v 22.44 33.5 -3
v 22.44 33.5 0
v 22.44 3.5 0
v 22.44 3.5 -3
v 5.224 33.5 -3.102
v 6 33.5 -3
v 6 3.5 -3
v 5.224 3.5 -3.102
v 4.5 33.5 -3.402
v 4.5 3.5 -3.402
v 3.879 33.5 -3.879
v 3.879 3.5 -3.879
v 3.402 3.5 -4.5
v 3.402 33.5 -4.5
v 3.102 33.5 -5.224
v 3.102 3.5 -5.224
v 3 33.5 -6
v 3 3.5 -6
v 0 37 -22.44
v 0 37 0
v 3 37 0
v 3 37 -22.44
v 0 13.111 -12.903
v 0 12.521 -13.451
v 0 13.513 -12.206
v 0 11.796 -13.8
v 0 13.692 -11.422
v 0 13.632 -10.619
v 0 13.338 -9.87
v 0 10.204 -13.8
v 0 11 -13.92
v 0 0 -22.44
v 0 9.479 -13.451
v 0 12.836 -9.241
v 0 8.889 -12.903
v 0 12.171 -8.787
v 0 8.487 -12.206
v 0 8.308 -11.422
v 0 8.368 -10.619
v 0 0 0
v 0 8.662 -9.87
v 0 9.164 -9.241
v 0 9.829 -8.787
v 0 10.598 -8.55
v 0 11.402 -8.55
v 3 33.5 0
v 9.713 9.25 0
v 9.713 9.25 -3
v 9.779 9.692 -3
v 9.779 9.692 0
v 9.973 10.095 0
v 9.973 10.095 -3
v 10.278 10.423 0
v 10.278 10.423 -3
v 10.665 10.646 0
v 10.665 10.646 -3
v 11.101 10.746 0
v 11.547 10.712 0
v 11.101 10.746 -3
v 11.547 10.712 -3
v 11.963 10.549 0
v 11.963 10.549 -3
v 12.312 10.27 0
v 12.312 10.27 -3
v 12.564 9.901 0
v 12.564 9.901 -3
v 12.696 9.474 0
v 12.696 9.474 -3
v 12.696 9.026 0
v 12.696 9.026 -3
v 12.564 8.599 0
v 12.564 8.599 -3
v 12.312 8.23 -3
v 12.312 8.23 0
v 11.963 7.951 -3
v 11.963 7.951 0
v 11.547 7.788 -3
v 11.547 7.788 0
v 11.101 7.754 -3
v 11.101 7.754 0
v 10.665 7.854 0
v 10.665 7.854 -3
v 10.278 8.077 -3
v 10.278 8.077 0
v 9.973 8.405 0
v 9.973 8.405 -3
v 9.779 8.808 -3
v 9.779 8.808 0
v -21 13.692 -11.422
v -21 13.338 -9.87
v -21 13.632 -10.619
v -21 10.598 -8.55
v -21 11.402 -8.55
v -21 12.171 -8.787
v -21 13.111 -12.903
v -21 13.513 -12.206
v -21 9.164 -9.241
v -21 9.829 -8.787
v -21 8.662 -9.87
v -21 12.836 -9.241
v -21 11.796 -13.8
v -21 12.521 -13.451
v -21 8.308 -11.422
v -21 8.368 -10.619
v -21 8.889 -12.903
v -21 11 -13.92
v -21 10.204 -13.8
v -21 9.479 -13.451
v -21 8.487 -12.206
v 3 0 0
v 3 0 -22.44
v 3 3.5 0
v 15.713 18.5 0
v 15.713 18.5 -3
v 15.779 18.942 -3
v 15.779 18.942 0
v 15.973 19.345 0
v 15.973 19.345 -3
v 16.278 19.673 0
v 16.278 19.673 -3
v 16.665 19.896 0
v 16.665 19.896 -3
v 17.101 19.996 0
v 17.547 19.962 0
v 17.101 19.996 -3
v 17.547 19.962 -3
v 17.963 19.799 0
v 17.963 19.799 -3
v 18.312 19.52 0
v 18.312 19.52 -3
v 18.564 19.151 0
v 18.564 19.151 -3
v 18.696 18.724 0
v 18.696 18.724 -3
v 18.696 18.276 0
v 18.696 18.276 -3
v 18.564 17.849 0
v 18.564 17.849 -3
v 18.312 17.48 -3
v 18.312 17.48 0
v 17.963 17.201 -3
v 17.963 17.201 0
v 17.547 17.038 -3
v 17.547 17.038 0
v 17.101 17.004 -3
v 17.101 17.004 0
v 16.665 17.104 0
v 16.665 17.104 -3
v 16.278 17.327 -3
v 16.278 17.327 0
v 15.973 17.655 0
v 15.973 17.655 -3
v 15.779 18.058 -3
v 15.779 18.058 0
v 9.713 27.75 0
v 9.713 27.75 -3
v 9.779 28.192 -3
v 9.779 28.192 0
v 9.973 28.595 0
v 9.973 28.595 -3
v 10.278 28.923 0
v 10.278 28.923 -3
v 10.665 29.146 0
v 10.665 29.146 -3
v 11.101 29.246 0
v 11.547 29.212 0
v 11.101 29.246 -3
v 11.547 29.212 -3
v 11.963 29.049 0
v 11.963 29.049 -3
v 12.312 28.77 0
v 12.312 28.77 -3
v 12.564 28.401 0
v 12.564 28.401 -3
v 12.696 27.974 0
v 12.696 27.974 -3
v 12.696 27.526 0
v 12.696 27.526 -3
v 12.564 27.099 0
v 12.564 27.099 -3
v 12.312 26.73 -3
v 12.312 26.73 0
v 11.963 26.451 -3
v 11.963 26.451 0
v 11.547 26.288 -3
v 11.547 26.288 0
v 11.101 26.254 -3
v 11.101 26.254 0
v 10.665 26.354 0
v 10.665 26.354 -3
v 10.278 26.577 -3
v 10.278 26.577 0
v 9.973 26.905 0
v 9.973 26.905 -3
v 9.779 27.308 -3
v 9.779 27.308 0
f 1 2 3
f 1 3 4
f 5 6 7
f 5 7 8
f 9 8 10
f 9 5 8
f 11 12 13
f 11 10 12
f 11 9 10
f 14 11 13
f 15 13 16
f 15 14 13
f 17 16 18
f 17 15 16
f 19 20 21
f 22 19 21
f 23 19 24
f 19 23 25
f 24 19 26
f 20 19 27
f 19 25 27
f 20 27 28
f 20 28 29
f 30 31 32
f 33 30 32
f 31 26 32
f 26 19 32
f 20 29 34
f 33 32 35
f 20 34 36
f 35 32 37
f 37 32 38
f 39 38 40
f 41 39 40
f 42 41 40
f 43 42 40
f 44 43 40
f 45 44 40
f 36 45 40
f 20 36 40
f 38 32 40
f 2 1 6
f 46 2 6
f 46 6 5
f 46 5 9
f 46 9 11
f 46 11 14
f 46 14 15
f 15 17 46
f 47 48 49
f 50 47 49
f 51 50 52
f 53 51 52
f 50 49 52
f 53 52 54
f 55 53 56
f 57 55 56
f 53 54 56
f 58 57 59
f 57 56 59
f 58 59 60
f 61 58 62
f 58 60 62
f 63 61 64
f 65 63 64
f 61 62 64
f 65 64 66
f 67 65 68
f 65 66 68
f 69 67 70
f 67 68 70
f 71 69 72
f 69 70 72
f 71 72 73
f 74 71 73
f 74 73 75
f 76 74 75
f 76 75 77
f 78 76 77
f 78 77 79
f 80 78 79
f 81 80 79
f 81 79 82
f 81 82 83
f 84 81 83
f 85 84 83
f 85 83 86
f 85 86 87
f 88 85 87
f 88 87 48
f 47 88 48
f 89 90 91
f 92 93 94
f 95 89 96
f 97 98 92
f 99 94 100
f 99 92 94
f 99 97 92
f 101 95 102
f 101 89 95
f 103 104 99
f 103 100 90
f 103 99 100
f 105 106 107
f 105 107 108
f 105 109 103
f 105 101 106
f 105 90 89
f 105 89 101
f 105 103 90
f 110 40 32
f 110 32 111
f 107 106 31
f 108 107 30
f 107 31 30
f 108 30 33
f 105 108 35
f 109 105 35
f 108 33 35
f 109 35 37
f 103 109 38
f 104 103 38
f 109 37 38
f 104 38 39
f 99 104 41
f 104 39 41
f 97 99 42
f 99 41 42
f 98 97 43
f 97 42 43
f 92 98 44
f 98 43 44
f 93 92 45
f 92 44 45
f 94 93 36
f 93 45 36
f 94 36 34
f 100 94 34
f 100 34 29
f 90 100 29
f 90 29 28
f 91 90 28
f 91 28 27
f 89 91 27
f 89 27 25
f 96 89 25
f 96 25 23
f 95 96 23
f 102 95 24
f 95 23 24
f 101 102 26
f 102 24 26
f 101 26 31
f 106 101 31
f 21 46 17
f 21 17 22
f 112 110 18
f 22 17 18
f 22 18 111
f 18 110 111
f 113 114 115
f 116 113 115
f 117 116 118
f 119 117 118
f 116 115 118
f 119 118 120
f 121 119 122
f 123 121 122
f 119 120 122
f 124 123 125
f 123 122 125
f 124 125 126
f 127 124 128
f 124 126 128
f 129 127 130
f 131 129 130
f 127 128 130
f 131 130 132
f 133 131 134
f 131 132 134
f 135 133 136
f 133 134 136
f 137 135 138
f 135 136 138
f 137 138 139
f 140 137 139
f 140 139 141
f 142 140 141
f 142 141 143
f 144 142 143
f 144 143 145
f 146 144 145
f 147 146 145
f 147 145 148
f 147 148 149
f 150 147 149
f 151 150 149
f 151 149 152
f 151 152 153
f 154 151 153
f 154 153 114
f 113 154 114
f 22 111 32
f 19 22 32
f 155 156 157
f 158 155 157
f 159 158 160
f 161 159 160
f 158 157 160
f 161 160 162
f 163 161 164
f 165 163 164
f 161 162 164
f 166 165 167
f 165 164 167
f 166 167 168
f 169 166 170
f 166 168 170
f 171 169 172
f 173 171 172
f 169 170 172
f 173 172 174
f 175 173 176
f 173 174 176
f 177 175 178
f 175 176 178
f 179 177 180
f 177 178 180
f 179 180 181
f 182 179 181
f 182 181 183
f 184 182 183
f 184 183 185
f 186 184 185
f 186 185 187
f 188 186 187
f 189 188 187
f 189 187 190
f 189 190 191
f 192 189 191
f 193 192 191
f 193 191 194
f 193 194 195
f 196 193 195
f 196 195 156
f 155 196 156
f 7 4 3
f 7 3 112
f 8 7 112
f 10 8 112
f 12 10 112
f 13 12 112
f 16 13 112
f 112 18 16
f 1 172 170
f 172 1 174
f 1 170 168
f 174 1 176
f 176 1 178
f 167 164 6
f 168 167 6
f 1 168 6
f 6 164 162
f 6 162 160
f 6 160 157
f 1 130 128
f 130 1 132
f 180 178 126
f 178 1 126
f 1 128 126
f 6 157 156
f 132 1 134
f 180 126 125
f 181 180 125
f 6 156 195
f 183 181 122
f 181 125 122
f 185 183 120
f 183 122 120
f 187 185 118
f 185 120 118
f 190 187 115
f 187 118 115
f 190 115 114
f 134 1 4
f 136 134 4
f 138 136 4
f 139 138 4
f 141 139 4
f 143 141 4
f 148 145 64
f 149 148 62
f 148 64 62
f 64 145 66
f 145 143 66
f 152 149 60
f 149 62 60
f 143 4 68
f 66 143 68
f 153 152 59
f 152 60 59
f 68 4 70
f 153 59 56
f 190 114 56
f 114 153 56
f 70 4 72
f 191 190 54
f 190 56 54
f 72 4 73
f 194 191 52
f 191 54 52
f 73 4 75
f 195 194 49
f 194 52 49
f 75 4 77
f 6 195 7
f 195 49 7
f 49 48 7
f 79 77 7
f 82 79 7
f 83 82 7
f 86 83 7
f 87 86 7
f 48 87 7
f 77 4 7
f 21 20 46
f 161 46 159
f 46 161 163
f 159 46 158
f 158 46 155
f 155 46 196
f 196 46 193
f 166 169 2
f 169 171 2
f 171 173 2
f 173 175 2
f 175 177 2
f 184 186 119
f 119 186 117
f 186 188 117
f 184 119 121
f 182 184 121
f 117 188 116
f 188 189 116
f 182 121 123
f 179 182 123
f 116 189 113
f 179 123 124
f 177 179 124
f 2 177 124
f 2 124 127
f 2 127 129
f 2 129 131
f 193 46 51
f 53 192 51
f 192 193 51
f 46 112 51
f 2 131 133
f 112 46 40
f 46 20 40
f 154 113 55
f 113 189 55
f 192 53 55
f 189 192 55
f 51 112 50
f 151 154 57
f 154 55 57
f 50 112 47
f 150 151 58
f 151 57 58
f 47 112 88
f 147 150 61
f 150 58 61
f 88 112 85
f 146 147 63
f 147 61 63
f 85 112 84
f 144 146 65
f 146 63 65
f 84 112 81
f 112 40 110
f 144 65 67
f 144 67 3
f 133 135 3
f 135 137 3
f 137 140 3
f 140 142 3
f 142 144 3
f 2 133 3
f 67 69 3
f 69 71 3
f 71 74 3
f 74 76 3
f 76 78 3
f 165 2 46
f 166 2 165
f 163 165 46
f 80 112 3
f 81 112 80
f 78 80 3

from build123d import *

# Parameters (mm, degrees)
BOSS_EXTRUDE1_DEPTH = 37
FILLET1_R           = 3
SKETCH2_R           = 1.5
SKETCH2_W           = 19.44
SKETCH2_H           = 3.5
CUT_EXTRUDE1_DEPTH  = 49.745330033
SKETCH3_R           = 2.7
BOSS_EXTRUDE2_DEPTH = 21


with BuildPart() as part:
    # Sketch1 → Boss-Extrude1 (new body)
    with BuildSketch(Plane(origin=(0, 0, 0), x_dir=(1, 0, 0), z_dir=(0, 1, 0))):
        Polygon((0, 0), (22.44, 0), (22.44, 3), (3, 3), (3, 22.44), (0, 22.44), align=None)
    extrude(amount=BOSS_EXTRUDE1_DEPTH)

    # Fillet1
    fillet1_edges = [part.edges().sort_by_distance(p)[0] for p in [
        (3, 18.5, -3),
    ]]
    fillet(fillet1_edges, radius=FILLET1_R)

    # Sketch2 → Cut-Extrude1 (cut, through all)
    with BuildSketch(Plane(origin=(0, 0, -22.44), x_dir=(-1, 0, 0), z_dir=(0, 0, -1))):
        with Locations((-11.212785563, 27.75)):
            Circle(SKETCH2_R)
        with Locations((-17.212785563, 18.5)):
            Circle(SKETCH2_R)
        with Locations((-11.212785563, 9.25)):
            Circle(SKETCH2_R)
        with Locations((-12.72, 1.75)):
            Rectangle(SKETCH2_W, SKETCH2_H)
        with Locations((-12.72, 35.25)):
            Rectangle(SKETCH2_W, SKETCH2_H)
    extrude(amount=-CUT_EXTRUDE1_DEPTH, mode=Mode.SUBTRACT)

    # Sketch3 → Boss-Extrude2 (add)
    with BuildSketch(Plane.ZY):
        with Locations(Location((-11.22, 11, 0), (0, 0, 180))):
            Circle(SKETCH3_R)
    extrude(amount=BOSS_EXTRUDE2_DEPTH)


solid = part.part
